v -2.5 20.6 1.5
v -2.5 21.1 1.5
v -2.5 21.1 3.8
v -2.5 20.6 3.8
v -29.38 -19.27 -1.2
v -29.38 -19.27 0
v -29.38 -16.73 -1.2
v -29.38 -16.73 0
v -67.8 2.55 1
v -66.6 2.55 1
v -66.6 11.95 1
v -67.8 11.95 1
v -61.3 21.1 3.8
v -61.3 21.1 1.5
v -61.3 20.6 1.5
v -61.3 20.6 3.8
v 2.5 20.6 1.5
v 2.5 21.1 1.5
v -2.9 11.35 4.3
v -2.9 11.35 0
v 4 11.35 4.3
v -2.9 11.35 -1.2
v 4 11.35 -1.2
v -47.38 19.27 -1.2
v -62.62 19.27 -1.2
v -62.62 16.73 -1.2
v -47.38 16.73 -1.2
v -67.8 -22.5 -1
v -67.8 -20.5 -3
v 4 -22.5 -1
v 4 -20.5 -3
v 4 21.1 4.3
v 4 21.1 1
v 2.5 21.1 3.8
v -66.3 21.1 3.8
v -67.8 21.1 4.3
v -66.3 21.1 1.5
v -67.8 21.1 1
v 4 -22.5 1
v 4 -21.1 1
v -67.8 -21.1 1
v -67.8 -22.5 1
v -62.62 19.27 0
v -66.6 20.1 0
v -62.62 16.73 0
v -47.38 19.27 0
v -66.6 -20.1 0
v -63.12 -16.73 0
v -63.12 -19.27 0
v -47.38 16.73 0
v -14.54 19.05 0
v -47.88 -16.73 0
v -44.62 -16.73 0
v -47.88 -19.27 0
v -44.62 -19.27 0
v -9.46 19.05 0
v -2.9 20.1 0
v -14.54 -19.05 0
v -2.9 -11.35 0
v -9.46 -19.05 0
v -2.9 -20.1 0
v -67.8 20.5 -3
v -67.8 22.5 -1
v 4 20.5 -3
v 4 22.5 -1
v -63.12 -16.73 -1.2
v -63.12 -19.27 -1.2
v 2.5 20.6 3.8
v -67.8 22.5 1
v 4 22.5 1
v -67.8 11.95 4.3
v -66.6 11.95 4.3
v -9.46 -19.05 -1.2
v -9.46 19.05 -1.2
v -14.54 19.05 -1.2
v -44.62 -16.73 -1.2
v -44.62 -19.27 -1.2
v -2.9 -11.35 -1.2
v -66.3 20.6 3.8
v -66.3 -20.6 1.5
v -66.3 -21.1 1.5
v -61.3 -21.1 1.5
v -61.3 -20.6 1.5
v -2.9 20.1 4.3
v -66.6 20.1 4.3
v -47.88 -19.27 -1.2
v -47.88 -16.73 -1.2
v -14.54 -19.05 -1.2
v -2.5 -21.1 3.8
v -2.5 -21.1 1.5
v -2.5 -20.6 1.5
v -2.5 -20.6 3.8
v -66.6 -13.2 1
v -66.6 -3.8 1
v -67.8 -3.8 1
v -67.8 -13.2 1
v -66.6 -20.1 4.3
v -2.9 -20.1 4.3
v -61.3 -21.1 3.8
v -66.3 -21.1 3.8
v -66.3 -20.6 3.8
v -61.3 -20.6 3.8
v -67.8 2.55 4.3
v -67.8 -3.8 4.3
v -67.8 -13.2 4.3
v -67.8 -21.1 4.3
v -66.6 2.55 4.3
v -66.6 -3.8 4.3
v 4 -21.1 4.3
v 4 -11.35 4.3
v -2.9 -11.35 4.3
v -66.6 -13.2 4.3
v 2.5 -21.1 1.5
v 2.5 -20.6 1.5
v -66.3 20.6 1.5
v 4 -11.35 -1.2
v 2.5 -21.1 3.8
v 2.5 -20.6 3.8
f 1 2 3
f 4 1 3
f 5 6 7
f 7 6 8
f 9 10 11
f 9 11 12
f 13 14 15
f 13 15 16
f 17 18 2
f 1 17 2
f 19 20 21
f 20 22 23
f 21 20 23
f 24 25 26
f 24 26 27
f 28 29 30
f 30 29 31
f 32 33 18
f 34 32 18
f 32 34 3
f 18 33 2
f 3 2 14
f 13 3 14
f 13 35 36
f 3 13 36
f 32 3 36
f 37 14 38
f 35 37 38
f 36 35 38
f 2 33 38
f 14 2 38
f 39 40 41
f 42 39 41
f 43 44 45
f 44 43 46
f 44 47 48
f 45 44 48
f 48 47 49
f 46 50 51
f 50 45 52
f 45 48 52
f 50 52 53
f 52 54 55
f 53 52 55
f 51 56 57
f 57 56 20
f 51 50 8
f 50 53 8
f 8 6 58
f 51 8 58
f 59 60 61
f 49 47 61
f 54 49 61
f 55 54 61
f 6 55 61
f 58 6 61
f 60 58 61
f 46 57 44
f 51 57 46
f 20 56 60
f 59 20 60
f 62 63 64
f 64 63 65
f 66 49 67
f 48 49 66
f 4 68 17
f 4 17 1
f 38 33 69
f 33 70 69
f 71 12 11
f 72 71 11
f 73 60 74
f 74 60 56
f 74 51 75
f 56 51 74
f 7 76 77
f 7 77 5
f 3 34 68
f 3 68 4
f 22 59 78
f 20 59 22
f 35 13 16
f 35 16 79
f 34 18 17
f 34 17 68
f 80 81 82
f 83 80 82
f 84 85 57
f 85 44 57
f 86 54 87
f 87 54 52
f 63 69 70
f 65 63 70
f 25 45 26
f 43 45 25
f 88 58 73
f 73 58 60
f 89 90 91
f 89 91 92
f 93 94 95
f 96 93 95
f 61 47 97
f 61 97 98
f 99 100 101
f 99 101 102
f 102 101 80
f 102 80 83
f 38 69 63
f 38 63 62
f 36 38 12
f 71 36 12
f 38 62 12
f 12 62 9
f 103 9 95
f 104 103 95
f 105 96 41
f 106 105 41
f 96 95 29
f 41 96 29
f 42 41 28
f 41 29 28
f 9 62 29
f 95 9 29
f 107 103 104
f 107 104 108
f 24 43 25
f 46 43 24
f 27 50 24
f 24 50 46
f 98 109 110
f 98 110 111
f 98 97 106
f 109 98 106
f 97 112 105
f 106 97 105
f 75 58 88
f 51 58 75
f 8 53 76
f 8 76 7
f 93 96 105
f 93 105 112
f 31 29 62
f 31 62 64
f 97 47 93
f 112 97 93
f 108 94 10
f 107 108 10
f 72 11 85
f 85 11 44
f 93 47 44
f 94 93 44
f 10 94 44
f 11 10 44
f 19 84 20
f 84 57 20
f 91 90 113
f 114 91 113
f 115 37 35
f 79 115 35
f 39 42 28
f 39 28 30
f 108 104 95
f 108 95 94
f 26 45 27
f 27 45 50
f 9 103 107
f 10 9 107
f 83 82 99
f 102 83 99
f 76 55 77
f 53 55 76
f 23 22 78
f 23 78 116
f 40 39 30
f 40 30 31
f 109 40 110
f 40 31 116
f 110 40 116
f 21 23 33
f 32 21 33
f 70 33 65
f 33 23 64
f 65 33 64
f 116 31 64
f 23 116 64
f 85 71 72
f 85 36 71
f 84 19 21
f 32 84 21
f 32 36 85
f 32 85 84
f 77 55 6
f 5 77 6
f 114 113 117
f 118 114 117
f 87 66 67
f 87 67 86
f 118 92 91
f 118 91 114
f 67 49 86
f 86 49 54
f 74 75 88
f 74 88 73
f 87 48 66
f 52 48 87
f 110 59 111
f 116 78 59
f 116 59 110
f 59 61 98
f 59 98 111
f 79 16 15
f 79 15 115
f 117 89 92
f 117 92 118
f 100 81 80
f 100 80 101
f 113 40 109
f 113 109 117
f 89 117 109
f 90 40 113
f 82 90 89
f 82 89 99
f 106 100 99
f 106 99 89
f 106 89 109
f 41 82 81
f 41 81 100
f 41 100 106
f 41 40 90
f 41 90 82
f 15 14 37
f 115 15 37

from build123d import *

# Parameters (mm, degrees)
PAD_DEPTH       = 1
SKETCH002_W     = 71.8
SKETCH002_H     = 45
PAD001_DEPTH    = 3
SKETCH003_W     = 6.9
SKETCH003_H     = 22.7
SKETCH003_W_2   = 5.08
SKETCH003_H_2   = 38.099998
SKETCH003_W_3   = 15.24
SKETCH003_H_3   = 2.54
POCKET_DEPTH    = 1.2
SKETCH004_W     = 1.2
SKETCH004_H     = 6.35
PAD002_DEPTH    = 3.3
SKETCH008_W     = 5
SKETCH008_H     = 2.3
POCKET001_DEPTH = 0.5
SKETCH009_W     = 5
SKETCH009_H     = 2.3
POCKET002_DEPTH = 0.5
CHAMFER002_SIZE = 2


with BuildPart() as part:
    # Sketch001 → Pad (new body)
    with BuildSketch(Plane.XY):
        Polygon((-66.6, 20.1), (-66.6, -20.1), (-2.9, -20.1), (-2.9, -11.35), (4, -11.35), (4, -22.5), (-67.8, -22.5), (-67.8, 22.5), (4, 22.5), (4, 11.35), (-2.9, 11.35), (-2.9, 20.1), align=None)
    extrude(amount=PAD_DEPTH)

    # Sketch002 (on Face13 of Pad) → Pad001 (join)
    with BuildSketch(Plane(origin=(0, 0, 0), x_dir=(1, 0, 0), z_dir=(0, 0, -1))):
        with Locations((-31.9, 0)):
            Rectangle(SKETCH002_W, SKETCH002_H)
    extrude(amount=PAD001_DEPTH)

    # Sketch003 (on Face4 of Pad001) → Pocket (cut)
    with BuildSketch(Plane.XY):
        with Locations((0.55, 0)):
            Rectangle(SKETCH003_W, SKETCH003_H)
        with Locations((-12, 0)):
            Rectangle(SKETCH003_W_2, SKETCH003_H_2)
        with Locations((-55, 18)):
            Rectangle(SKETCH003_W_3, SKETCH003_H_3)
        with Locations((-55.5, -18)):
            Rectangle(SKETCH003_W_3, SKETCH003_H_3)
        with Locations((-37, -18)):
            Rectangle(SKETCH003_W_3, SKETCH003_H_3)
    extrude(amount=-POCKET_DEPTH, mode=Mode.SUBTRACT)

    # Sketch004 (on Face5 of Pocket) → Pad002 (join)
    with BuildSketch(Plane.XY.offset(1)):
        with Locations((-67.2, -0.625)):
            Rectangle(SKETCH004_W, SKETCH004_H)
        Polygon((-67.8, 11.95), (-66.6, 11.95), (-66.6, 20.1), (-2.9, 20.1), (-2.9, 11.35), (4, 11.35), (4, 21.1), (-67.8, 21.1), align=None)
        Polygon((-67.8, -13.2), (-66.6, -13.2), (-66.6, -20.1), (-2.9, -20.1), (-2.9, -11.35), (4, -11.35), (4, -21.1), (-67.8, -21.1), align=None)
    extrude(amount=PAD002_DEPTH)

    # Sketch008 (on Face12 of Pad002) → Pocket001 (cut)
    with BuildSketch(Plane(origin=(0, 21.1, 0), x_dir=(-1, 0, 0), z_dir=(0, 1, 0))):
        with Locations((63.8, 2.65)):
            Rectangle(SKETCH008_W, SKETCH008_H)
        with Locations((0, 2.65)):
            Rectangle(SKETCH008_W, SKETCH008_H)
    extrude(amount=-POCKET001_DEPTH, mode=Mode.SUBTRACT)

    # Sketch009 (on Face2 of Pocket001) → Pocket002 (cut)
    with BuildSketch(Plane.XZ.offset(21.1)):
        with Locations((-63.8, 2.65)):
            Rectangle(SKETCH009_W, SKETCH009_H)
        with Locations((0, 2.65)):
            Rectangle(SKETCH009_W, SKETCH009_H)
    extrude(amount=-POCKET002_DEPTH, mode=Mode.SUBTRACT)

    # Chamfer002
    chamfer002_edges = [part.edges().sort_by_distance(p)[0] for p in [
        (-31.9, 22.5, -3),
        (-31.9, -22.5, -3),
    ]]
    chamfer(chamfer002_edges, length=CHAMFER002_SIZE)


solid = part.part
